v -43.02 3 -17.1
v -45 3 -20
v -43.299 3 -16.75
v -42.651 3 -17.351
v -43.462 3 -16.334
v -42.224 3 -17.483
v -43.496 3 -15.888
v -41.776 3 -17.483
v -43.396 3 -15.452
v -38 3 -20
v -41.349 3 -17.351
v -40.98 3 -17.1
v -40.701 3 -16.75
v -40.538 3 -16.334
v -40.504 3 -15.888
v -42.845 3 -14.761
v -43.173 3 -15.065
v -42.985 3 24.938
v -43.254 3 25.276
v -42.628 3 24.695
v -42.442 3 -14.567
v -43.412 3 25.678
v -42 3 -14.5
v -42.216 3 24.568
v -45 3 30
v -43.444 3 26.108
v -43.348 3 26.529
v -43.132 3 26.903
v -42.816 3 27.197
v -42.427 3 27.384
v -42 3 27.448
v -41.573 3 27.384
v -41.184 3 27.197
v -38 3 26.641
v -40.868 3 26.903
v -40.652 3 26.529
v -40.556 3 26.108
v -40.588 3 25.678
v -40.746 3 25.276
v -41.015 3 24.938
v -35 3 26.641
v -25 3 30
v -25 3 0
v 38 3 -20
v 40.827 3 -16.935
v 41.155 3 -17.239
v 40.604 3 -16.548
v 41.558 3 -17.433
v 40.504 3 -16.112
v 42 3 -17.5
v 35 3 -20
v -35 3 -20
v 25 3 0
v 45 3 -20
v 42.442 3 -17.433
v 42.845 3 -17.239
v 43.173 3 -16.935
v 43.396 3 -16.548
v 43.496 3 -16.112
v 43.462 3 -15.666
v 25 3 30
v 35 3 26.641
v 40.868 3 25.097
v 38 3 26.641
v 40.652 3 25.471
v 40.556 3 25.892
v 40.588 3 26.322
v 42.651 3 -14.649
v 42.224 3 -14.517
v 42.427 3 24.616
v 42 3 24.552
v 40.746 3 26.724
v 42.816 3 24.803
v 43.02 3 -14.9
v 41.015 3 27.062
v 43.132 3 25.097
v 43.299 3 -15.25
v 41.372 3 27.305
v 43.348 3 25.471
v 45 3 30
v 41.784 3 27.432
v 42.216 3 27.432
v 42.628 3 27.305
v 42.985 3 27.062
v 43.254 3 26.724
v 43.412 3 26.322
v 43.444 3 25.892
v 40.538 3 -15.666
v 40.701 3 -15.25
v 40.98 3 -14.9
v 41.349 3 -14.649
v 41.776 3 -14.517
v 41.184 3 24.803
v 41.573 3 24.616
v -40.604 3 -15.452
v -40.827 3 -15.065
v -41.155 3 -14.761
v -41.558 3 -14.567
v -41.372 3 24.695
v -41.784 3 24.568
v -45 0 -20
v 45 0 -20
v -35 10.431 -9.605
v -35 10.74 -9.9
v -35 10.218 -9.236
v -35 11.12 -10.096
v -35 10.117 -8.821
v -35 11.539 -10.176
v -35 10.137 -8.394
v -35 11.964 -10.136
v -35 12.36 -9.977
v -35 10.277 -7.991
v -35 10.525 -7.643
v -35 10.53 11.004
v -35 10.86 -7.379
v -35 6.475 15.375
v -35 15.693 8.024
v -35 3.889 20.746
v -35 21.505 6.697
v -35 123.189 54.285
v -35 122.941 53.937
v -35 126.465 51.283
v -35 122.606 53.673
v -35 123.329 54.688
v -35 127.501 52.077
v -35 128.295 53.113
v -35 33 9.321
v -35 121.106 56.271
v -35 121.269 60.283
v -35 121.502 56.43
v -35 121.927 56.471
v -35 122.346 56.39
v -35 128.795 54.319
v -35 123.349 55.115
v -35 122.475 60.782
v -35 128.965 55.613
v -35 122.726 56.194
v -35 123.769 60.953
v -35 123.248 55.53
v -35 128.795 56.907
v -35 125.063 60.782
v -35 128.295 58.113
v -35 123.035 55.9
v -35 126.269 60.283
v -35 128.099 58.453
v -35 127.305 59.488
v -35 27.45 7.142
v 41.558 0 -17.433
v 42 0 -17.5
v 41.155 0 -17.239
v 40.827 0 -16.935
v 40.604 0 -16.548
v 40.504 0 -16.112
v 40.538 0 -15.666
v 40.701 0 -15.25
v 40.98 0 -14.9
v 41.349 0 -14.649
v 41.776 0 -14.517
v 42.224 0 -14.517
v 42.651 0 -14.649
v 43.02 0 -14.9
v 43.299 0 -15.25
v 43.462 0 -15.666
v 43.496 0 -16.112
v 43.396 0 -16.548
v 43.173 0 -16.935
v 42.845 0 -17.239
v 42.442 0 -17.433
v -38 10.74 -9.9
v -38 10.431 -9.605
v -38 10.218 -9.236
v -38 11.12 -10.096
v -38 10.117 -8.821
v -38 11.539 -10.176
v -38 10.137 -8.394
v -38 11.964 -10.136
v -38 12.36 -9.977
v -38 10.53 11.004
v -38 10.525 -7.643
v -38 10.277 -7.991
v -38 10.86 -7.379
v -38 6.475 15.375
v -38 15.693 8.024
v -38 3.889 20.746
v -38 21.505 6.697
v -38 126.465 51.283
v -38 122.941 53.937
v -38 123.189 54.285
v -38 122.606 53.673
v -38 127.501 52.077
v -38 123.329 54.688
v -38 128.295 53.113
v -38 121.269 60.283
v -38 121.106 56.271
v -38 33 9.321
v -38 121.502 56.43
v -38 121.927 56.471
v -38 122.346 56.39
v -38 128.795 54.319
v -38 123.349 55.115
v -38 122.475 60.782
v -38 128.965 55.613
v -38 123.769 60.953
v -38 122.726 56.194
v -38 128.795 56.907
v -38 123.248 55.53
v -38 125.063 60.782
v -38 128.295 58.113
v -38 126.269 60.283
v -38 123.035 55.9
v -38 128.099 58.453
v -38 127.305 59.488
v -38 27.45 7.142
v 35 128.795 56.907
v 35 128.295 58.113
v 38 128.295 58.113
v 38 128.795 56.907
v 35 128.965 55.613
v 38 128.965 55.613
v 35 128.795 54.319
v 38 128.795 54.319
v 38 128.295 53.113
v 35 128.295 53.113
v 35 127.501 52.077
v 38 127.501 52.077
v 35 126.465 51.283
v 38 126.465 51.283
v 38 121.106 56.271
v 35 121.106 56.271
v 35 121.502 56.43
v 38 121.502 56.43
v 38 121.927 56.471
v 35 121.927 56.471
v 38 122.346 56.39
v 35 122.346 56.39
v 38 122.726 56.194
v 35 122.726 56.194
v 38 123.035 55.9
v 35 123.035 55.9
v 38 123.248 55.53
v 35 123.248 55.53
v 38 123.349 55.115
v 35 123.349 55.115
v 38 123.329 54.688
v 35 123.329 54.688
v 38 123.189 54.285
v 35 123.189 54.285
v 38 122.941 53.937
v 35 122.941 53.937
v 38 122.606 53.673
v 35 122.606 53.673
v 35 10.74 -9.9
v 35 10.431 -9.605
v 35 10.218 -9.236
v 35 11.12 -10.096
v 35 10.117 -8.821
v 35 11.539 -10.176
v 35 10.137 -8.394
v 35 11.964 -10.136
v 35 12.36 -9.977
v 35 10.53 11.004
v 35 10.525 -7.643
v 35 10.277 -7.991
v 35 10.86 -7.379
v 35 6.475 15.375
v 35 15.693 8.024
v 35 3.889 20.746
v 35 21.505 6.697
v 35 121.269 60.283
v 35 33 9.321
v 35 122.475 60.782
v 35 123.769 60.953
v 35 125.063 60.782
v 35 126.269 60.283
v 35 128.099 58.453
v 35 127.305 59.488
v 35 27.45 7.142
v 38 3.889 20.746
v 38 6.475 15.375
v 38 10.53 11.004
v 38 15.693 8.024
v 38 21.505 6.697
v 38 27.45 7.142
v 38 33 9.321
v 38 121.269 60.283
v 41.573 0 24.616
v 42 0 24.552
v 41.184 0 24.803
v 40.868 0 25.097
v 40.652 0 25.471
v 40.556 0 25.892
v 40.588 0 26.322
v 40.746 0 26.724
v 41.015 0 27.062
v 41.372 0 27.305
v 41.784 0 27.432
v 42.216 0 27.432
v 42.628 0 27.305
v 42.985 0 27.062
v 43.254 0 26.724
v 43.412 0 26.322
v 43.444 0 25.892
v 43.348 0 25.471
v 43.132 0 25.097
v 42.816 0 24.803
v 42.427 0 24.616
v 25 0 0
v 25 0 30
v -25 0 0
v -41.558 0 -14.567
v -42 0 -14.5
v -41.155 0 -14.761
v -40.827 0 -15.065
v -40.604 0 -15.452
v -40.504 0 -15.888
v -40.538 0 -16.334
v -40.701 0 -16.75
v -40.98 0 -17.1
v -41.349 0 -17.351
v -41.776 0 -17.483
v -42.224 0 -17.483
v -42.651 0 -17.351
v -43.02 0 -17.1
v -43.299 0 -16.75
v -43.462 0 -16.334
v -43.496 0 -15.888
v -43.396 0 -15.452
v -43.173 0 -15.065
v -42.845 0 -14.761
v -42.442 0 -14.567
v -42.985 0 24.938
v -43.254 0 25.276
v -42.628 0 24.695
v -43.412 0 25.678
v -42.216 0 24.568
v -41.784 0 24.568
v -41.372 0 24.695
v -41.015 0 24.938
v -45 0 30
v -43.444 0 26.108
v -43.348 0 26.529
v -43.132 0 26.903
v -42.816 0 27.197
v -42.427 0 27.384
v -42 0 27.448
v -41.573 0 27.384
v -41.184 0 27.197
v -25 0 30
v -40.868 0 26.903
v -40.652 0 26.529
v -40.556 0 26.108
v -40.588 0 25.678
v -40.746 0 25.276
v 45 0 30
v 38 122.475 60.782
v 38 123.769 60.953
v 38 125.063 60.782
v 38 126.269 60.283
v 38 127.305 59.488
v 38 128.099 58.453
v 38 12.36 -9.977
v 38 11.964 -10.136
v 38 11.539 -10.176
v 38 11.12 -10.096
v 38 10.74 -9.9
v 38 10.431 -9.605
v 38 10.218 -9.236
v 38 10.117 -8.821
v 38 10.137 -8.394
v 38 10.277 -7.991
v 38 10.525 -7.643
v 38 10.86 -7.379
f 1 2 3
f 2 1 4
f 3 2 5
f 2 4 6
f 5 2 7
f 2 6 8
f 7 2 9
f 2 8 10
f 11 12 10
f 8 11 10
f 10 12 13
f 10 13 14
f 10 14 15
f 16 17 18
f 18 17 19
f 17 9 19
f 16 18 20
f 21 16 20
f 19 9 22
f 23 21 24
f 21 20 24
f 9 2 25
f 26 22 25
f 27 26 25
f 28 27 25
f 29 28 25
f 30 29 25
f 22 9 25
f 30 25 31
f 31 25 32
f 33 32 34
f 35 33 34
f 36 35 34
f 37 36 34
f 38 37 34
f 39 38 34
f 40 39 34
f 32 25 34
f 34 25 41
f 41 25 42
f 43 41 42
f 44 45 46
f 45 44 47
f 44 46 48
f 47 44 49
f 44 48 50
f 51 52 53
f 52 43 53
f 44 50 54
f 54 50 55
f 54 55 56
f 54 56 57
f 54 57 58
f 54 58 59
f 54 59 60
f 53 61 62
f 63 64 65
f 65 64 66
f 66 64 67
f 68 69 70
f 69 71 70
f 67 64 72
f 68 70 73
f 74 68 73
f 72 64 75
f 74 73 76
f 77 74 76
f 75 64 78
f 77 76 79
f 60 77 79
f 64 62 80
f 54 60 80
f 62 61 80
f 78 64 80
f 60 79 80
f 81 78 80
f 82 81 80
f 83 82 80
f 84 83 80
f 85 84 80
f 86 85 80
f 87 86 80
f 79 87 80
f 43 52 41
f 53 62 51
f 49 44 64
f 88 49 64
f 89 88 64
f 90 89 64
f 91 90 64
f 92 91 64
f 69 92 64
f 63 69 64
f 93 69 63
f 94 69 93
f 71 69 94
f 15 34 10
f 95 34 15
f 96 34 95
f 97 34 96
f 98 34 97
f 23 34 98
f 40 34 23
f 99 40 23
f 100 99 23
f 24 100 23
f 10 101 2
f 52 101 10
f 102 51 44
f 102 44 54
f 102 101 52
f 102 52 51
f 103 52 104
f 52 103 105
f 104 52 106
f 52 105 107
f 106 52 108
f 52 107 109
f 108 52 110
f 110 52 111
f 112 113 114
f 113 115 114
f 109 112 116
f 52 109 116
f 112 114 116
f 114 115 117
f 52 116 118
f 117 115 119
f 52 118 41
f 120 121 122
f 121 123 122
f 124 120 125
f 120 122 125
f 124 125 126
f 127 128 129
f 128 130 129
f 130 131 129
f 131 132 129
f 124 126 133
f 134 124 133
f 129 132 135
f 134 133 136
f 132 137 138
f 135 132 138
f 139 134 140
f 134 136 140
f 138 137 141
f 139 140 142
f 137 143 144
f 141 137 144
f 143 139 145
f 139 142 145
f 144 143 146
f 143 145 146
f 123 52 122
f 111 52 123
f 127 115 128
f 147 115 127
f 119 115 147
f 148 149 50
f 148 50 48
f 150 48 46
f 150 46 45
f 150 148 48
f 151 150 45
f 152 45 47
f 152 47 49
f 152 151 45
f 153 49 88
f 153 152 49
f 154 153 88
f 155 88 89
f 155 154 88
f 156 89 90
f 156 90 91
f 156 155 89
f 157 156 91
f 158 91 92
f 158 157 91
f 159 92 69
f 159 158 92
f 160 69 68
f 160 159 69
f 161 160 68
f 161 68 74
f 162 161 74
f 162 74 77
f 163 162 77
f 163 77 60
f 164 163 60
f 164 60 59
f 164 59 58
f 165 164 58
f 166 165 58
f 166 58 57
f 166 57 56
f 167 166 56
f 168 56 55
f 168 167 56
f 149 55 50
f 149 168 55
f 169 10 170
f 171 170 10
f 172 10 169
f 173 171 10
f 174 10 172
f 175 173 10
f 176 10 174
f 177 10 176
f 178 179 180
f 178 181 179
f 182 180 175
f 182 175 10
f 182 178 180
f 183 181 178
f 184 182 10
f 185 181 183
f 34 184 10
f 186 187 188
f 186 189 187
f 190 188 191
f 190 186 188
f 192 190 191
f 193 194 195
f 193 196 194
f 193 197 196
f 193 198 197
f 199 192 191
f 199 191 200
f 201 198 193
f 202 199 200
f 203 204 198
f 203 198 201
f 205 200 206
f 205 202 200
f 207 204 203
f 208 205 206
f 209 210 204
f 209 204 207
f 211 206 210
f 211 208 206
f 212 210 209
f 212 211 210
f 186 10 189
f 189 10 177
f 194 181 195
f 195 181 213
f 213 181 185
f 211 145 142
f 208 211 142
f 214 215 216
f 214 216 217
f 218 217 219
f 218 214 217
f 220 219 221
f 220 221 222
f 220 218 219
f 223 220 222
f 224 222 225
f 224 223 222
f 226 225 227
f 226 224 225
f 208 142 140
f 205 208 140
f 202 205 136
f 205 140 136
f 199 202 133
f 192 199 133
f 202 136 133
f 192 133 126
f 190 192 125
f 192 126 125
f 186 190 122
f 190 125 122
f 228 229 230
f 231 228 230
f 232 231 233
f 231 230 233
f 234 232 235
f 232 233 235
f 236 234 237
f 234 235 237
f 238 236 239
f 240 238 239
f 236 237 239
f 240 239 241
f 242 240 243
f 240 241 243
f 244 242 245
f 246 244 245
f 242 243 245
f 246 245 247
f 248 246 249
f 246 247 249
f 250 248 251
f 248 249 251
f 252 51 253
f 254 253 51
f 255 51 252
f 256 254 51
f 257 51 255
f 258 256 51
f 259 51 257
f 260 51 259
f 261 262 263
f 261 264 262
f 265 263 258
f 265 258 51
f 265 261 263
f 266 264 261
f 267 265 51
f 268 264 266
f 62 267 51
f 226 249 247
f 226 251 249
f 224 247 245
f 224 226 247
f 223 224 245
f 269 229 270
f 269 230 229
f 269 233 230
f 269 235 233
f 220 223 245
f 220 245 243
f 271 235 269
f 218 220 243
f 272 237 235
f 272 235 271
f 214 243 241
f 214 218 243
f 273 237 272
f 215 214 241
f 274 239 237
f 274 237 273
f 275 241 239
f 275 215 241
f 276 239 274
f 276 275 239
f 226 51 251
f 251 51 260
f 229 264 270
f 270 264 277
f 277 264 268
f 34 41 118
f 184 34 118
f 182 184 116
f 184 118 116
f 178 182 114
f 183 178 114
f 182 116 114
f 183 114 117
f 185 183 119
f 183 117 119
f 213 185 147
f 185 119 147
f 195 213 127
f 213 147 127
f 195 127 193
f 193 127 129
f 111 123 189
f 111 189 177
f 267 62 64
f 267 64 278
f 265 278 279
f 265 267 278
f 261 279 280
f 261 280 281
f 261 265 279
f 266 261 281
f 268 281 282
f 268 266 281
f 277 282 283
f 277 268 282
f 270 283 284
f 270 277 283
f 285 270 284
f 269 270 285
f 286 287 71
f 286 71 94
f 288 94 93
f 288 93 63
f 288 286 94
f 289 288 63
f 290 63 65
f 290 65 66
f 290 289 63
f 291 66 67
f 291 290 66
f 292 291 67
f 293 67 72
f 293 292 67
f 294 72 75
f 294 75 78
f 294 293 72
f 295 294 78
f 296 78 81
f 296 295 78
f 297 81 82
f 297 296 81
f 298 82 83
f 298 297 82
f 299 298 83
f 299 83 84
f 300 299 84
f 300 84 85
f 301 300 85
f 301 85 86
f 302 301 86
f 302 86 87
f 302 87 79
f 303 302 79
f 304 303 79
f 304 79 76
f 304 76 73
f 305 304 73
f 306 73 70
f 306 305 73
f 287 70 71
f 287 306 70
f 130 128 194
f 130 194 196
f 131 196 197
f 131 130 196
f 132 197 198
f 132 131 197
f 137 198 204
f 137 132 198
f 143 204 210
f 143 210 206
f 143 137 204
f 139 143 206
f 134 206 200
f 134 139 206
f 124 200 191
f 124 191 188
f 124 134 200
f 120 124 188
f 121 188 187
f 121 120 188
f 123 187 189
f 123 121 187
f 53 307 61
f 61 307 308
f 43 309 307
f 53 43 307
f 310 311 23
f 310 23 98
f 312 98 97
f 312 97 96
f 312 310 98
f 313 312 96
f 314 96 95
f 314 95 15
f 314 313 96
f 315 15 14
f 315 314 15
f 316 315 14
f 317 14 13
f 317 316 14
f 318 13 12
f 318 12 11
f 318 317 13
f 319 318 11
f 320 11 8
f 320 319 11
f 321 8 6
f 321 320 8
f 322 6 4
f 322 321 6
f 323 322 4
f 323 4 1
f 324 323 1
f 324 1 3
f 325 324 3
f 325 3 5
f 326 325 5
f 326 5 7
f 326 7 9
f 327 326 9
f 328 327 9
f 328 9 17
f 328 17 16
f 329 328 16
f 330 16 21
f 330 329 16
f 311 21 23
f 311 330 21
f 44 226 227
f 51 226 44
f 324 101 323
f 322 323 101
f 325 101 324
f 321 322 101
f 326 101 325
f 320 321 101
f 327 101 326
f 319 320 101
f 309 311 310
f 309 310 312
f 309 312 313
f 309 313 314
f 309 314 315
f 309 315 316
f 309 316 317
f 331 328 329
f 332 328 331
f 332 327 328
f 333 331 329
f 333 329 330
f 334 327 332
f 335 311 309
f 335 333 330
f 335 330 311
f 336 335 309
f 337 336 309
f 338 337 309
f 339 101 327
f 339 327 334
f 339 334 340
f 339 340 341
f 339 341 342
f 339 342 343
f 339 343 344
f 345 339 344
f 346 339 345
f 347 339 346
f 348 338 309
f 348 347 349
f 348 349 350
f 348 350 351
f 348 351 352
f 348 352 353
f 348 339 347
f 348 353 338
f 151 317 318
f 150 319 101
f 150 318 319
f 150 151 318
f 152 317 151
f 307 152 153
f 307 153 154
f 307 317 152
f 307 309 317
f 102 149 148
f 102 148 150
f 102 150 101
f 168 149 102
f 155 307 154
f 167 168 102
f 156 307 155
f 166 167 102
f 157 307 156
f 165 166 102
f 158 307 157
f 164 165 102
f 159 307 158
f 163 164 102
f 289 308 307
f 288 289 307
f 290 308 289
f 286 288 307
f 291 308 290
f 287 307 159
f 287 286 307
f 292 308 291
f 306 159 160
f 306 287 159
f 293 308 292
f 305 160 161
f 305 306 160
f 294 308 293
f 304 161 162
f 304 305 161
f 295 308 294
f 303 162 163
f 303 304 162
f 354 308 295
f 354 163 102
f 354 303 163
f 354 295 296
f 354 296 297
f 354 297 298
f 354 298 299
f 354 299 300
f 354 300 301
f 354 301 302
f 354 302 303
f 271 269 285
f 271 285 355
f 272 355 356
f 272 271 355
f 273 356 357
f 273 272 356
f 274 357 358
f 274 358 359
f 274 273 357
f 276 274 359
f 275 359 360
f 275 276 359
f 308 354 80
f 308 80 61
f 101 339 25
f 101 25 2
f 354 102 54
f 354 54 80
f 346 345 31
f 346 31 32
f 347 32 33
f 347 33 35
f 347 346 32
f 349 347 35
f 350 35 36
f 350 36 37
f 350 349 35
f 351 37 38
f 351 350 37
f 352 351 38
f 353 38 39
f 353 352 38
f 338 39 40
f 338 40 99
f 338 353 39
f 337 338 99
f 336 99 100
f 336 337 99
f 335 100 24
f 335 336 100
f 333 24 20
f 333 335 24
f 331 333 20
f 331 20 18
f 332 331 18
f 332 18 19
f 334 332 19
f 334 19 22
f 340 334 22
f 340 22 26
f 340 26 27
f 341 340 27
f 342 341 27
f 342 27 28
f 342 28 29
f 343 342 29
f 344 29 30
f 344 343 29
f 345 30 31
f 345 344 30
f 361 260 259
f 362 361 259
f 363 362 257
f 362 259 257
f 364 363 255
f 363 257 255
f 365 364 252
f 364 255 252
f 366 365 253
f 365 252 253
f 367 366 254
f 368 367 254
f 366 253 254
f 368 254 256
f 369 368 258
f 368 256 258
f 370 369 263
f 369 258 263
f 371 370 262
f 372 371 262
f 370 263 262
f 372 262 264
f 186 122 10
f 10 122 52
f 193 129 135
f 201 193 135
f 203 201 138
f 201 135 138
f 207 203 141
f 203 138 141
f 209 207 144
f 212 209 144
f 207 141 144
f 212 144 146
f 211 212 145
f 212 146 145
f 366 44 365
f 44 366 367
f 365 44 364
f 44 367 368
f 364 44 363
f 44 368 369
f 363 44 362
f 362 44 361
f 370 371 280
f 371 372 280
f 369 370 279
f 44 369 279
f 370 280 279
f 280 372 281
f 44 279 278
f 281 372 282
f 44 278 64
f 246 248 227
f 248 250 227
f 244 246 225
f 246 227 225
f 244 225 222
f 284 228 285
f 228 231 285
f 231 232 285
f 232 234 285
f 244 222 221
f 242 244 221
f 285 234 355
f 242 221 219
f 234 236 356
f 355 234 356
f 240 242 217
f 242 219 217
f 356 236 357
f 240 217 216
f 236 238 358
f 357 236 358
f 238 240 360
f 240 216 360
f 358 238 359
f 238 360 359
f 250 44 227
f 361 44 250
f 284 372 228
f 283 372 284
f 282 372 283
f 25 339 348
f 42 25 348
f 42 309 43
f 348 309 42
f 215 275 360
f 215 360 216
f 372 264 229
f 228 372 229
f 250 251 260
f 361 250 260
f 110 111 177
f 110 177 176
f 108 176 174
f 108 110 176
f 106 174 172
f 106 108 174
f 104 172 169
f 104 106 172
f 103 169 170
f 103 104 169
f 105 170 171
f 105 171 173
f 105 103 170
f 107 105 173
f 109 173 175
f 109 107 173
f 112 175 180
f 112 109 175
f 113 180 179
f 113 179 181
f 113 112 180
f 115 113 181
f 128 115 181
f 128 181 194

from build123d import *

# Parameters (mm, degrees)
SKETCH_1_R      = 1.448445572
SKETCH_1_R_2    = 1.5
EXTRUDE_1_DEPTH = 3
EXTRUDE_2_DEPTH = 3
SKETCH_5_W      = 10
SKETCH_5_H      = 30
EXTRUDE_3_DEPTH = 3


with BuildPart() as part:
    # 草图1 → 凸台-拉伸1 (new body)
    with BuildSketch(Plane(origin=(0, 0, 0), x_dir=(1, 0, 0), z_dir=(0, 1, 0))):
        Polygon((0, 0), (-35, 0), (-35, -30), (-45, -30), (-45, 20), (45, 20), (45, -30), (35, -30), (35, 0), align=None)
        with Locations(Location((-42, -26, 0), (0, 0, 270))):
            Circle(SKETCH_1_R, mode=Mode.SUBTRACT)
        with Locations(Location((-42, 16, 0), (0, 0, 270))):
            Circle(SKETCH_1_R_2, mode=Mode.SUBTRACT)
        with Locations(Location((42, -26, 0), (0, 0, 90))):
            Circle(SKETCH_1_R, mode=Mode.SUBTRACT)
        with Locations(Location((42, 16, 0), (0, 0, 90))):
            Circle(SKETCH_1_R_2, mode=Mode.SUBTRACT)
    extrude(amount=EXTRUDE_1_DEPTH)

    # 草图2 → 凸台-拉伸2 (add)
    with BuildSketch(Plane(origin=(-35, 0, 0), x_dir=(0, 0, -1), z_dir=(1, 0, 0))):
        with BuildLine():
            Line((-9.320508076, 33), (-60.282676081, 121.269064248))
            ThreePointArc((-60.282676081, 121.269064248), (-60.782178193, 125.063159474), (-58.452549062, 128.099191267))
            Line((-58.452549062, 128.099191267), (-58.1128031, 128.29534369))
            ThreePointArc((-58.1128031, 128.29534369), (-54.318707874, 128.794845803), (-51.282676081, 126.465216671))
            Line((-51.282676081, 126.465216671), (20, 3))
            Line((20, 3), (8, 3))
            Line((8, 3), (-26.641016151, 3))
            ThreePointArc((-26.641016151, 3), (-9.320508076, 13), (-9.320508076, 33))
        make_face()
        with BuildLine():
            Line((-53.673261241, 122.605831628), (9.977098662, 12.360174356))
            ThreePointArc((9.977098662, 12.360174356), (9.428060557, 10.31113625), (7.379022451, 10.860174356))
            Line((7.379022451, 10.860174356), (-56.271337452, 121.105831628))
            ThreePointArc((-56.271337452, 121.105831628), (-55.722299346, 123.154869734), (-53.673261241, 122.605831628))
        make_face(mode=Mode.SUBTRACT)
    extrude_2 = extrude(amount=-EXTRUDE_2_DEPTH)

    # 镜向1: 凸台-拉伸2 across plane
    add(extrude_2.mirror(Plane(origin=(0, 0, 0), x_dir=(0, 0, 1), z_dir=(1, 0, 0))))

    # 草图5 → 凸台-拉伸3 (add)
    with BuildSketch(Plane.XZ):
        with Locations((-30, 15)):
            Rectangle(SKETCH_5_W, SKETCH_5_H)
        with Locations((30, 15)):
            Rectangle(SKETCH_5_W, SKETCH_5_H)
    extrude(amount=-EXTRUDE_3_DEPTH)


solid = part.part
